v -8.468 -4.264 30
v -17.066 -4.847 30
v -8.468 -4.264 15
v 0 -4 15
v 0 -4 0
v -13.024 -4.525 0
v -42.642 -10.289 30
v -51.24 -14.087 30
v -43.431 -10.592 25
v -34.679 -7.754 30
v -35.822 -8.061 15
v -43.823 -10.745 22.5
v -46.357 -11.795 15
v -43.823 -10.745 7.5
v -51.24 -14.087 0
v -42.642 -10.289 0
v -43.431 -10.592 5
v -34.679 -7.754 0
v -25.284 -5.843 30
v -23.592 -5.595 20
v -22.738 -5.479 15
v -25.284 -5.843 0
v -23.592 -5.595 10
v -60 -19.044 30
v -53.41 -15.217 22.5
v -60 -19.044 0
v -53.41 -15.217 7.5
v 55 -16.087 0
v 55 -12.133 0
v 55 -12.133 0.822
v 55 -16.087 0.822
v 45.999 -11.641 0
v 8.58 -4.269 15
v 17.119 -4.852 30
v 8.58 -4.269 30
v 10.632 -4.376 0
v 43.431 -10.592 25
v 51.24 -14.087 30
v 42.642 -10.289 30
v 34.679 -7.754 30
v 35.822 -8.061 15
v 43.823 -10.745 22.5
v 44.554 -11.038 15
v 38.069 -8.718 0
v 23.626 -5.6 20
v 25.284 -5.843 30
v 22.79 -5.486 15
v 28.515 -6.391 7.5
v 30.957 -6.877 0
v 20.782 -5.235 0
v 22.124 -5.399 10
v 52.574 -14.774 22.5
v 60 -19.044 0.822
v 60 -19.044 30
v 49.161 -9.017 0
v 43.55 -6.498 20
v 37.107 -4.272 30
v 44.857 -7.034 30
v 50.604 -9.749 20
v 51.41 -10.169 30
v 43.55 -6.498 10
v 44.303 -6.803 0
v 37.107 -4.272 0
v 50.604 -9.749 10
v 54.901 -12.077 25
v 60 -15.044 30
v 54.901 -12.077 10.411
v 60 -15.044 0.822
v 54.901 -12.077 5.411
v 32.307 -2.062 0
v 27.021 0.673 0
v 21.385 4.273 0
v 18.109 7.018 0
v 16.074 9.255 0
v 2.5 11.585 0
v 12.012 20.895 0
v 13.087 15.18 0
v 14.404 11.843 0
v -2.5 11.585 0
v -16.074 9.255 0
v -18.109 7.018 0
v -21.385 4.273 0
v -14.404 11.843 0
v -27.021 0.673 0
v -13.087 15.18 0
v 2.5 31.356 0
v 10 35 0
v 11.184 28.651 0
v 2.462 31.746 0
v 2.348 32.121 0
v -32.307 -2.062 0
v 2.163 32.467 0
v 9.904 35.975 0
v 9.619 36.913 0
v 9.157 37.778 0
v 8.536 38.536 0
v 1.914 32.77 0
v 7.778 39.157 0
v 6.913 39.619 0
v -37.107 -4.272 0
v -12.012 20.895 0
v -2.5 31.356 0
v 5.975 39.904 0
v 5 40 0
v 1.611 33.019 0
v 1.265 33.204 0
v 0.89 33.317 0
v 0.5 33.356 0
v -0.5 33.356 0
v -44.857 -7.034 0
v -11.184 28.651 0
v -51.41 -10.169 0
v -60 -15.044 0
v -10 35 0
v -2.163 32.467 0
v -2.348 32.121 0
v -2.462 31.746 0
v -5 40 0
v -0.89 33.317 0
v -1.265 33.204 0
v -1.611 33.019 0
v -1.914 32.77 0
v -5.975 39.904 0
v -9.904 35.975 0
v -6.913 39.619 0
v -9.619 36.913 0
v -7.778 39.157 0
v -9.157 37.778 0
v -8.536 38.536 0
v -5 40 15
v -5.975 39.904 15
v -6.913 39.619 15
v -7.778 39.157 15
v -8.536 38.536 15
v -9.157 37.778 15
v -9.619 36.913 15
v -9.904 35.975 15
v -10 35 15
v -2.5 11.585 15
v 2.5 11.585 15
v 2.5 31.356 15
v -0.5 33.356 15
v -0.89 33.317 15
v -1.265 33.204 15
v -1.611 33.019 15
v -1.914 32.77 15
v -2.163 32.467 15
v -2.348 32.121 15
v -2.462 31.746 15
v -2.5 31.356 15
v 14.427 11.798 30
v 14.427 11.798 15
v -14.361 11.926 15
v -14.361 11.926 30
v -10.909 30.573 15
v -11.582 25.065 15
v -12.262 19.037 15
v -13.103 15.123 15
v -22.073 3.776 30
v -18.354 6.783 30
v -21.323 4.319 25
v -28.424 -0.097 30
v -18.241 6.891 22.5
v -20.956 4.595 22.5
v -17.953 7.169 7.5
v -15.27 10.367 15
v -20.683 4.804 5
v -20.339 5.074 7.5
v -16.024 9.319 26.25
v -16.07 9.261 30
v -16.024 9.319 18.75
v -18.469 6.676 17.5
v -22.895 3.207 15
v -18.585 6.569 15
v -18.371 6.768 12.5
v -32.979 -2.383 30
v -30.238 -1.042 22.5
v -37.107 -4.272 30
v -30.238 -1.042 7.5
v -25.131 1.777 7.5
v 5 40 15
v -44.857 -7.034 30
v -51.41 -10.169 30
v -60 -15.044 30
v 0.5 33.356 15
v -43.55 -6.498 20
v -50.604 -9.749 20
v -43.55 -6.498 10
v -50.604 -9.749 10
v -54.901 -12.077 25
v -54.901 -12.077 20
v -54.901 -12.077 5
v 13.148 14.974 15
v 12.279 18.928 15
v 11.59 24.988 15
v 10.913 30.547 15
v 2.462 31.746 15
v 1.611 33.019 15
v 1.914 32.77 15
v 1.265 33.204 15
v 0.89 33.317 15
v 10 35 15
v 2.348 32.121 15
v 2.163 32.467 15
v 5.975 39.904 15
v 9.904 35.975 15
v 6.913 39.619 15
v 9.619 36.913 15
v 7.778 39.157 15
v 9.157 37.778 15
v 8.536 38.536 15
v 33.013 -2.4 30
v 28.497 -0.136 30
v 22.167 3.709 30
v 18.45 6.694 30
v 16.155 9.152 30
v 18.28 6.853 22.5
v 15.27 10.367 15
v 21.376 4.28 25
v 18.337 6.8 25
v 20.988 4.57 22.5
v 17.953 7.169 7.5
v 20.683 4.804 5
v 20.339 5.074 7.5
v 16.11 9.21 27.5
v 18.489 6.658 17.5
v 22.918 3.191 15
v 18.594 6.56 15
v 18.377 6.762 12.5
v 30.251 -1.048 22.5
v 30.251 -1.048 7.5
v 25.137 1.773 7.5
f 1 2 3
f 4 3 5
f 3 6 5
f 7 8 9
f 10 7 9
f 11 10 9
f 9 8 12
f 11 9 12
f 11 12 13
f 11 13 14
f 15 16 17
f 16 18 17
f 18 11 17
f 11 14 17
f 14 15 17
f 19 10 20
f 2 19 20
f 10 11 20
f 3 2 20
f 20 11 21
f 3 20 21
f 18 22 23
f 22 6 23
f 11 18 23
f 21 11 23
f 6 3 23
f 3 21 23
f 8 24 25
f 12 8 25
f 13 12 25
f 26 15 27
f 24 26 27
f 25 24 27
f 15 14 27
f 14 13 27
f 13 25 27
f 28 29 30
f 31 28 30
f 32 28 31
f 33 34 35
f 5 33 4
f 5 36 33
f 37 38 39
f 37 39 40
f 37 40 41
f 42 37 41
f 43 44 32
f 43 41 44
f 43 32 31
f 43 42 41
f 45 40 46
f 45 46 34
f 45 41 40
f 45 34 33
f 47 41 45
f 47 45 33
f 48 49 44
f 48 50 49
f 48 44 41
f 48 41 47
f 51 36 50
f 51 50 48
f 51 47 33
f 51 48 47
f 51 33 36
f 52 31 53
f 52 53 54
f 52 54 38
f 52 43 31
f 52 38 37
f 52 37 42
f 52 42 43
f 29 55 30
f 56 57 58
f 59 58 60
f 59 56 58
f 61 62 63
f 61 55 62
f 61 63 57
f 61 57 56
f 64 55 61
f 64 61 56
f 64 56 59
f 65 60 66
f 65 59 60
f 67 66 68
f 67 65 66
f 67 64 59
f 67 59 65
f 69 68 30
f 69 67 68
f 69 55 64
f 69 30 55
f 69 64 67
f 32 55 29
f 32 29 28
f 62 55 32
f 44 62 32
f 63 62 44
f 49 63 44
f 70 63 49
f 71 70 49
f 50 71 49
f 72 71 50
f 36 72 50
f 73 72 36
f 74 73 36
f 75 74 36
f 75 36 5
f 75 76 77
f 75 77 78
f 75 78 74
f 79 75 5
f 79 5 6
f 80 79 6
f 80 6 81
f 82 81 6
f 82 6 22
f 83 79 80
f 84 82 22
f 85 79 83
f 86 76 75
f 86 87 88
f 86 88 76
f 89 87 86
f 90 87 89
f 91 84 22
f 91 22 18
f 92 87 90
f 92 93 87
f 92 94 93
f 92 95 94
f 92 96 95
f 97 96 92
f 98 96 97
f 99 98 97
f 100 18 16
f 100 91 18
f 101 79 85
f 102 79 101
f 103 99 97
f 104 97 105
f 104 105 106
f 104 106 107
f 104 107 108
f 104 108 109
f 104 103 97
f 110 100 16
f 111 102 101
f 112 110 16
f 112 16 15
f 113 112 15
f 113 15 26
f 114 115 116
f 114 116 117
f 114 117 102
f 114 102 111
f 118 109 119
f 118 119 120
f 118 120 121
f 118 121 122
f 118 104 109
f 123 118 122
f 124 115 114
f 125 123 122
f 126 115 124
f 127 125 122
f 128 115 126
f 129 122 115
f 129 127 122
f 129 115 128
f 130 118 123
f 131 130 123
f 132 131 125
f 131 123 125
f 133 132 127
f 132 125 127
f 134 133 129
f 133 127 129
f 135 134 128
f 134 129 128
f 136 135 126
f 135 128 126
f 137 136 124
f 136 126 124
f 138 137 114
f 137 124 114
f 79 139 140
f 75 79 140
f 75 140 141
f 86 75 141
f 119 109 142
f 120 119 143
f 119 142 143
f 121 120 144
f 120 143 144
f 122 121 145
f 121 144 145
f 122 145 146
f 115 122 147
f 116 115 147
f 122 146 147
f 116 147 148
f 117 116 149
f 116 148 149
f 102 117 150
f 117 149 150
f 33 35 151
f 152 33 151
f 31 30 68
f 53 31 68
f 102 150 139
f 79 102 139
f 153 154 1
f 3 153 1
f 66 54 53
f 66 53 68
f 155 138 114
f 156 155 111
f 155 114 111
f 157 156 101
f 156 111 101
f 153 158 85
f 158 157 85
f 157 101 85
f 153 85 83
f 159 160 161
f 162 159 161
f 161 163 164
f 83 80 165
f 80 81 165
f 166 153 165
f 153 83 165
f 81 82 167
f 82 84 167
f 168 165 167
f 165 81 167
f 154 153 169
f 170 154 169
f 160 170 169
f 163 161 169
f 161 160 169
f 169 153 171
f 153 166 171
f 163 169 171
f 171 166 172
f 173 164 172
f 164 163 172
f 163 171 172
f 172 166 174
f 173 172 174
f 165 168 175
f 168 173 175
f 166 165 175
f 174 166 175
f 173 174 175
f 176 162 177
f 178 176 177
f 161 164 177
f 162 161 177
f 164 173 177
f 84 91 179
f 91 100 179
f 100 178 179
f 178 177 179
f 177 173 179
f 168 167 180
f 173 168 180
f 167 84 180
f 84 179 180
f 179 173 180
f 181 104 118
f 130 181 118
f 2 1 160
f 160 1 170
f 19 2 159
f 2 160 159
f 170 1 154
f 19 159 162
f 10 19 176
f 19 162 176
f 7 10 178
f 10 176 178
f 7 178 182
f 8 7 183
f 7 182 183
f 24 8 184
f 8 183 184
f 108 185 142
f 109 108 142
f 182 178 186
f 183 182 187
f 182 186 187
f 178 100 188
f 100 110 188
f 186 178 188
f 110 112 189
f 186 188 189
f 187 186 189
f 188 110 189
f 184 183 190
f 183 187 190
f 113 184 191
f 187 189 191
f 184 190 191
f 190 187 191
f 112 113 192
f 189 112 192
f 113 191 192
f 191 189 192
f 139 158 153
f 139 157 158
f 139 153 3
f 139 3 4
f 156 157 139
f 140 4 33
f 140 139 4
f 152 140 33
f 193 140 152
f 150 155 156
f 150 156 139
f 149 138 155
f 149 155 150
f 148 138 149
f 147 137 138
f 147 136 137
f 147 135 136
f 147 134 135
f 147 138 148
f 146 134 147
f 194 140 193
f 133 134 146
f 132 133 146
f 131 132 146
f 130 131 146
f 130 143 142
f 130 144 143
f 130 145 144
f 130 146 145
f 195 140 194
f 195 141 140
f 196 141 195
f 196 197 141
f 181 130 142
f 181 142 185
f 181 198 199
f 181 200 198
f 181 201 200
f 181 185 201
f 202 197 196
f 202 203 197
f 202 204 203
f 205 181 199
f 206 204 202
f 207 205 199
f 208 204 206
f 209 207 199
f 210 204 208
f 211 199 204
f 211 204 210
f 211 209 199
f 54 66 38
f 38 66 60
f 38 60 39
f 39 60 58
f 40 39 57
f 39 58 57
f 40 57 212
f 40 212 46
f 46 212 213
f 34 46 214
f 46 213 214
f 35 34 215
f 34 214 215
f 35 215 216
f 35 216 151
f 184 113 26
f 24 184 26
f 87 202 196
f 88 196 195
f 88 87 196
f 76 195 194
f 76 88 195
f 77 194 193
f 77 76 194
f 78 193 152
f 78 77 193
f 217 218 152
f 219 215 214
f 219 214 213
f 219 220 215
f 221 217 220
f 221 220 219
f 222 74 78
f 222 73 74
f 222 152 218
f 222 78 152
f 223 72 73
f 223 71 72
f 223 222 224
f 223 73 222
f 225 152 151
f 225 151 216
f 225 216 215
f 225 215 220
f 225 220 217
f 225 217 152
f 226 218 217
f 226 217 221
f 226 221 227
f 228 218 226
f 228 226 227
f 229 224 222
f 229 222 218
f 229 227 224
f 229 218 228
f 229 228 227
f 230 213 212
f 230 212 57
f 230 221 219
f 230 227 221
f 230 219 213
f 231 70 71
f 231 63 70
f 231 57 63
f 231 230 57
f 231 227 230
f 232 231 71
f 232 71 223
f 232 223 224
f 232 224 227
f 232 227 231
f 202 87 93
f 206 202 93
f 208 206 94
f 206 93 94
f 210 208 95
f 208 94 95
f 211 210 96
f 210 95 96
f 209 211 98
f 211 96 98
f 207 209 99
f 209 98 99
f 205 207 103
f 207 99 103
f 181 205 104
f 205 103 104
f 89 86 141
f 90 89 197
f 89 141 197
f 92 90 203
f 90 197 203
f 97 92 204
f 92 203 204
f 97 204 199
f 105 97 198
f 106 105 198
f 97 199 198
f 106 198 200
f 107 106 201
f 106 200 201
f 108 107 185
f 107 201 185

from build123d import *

# Parameters (mm, degrees)
F1_DEPTH = 30
F3_DEPTH = 15
F5_DEPTH = 15
F6_W     = 5
F6_H     = 0.8216293063
F7_DEPTH = 19.0451266038


with BuildPart() as f1:
    # F0 (on Top) → F1 (new body)
    with BuildSketch(Plane.XY):
        with BuildLine():
            add(Edge.make_bspline(
                [(37.1067872729, -4.2723893299), (43.8225328786, -6.3263470576), (48.8563328981, -8.3856321871), (60, -15.0441265038)],
                knots=[0.5101508663, 0.5101508663, 0.5101508663, 0.5101508663, 1, 1, 1, 1], degree=3))
            add(Edge.make_bspline(
                [(10, 35), (12.5087825336, 25.2597781502), (9.2883909053, 8.4522198534), (30.3742546348, -1.2643312428), (37.1067872729, -4.2723893299)],
                knots=[0, 0, 0, 0, 0.494664071, 1, 1, 1, 1], degree=3))
            ThreePointArc((10, 35), (8.5355339059, 38.5355339059), (5, 40))
            Line((5, 40), (0, 40))
            Line((0, 40), (-5, 40))
            ThreePointArc((-5, 40), (-8.5355339059, 38.5355339059), (-10, 35))
            add(Edge.make_bspline(
                [(-10, 35), (-12.5087825336, 25.2597781502), (-9.2883909053, 8.4522198534), (-30.3742546348, -1.2643312428), (-37.1067872729, -4.2723893299)],
                knots=[0, 0, 0, 0, 0.494664071, 1, 1, 1, 1], degree=3))
            add(Edge.make_bspline(
                [(-37.1067872729, -4.2723893299), (-43.8225328786, -6.3263470576), (-48.8563328981, -8.3856321871), (-60, -15.0441265038)],
                knots=[0.5101508663, 0.5101508663, 0.5101508663, 0.5101508663, 1, 1, 1, 1], degree=3))
            Line((-60, -15.0441265038), (-60, -19.0441265038))
            add(Edge.make_bspline(
                [(-60, -19.0441265038), (-52.8339832092, -14.5790806997), (-35.6940193818, -5.9067861207), (-13.0268717706, -4.2301601805), (0, -4)],
                knots=[0, 0, 0, 0, 0.4618585351, 1, 1, 1, 1], degree=3))
            add(Edge.make_bspline(
                [(60, -19.0441265038), (52.8339832092, -14.5790806997), (35.6940193818, -5.9067861207), (13.0268717706, -4.2301601805), (0, -4)],
                knots=[0, 0, 0, 0, 0.4618585351, 1, 1, 1, 1], degree=3))
            Line((60, -19.0441265038), (60, -15.0441265038))
        make_face()
    extrude(amount=F1_DEPTH)

    # F2 (on face) → F3 (cut)
    with BuildSketch(Plane.XY.offset(30)):
        Polygon((15, 40), (-15, 40), (-15, 13.6816753075), (-6.9741668392, -8.3691200741), (7.0873022438, -8.3691200741), (15, 13.3708383381), align=None)
    extrude(amount=-F3_DEPTH, mode=Mode.SUBTRACT)

    # F4 (on face) → F5 (cut, through all)
    with BuildSketch(Plane.XY.offset(15)):
        with BuildLine():
            Line((0.5, 33.355844829), (-0.5, 33.355844829))
            ThreePointArc((-0.5, 33.355844829), (-1.9142135624, 32.7700583913), (-2.5, 31.355844829))
            Line((-2.5, 31.355844829), (-2.5, 11.5851387382))
            Line((-2.5, 11.5851387382), (2.5, 11.5851387382))
            Line((2.5, 11.5851387382), (2.5, 31.355844829))
            ThreePointArc((2.5, 31.355844829), (1.9142135624, 32.7700583913), (0.5, 33.355844829))
        make_face()
    extrude(amount=-F5_DEPTH, mode=Mode.SUBTRACT)

    # F6 (on Front) → F7 (cut, through all)
    with BuildSketch(Plane.XZ):
        with Locations((57.5, 0.4108146532)):
            Rectangle(F6_W, F6_H)
    extrude(amount=F7_DEPTH, mode=Mode.SUBTRACT)


solid = f1.part
